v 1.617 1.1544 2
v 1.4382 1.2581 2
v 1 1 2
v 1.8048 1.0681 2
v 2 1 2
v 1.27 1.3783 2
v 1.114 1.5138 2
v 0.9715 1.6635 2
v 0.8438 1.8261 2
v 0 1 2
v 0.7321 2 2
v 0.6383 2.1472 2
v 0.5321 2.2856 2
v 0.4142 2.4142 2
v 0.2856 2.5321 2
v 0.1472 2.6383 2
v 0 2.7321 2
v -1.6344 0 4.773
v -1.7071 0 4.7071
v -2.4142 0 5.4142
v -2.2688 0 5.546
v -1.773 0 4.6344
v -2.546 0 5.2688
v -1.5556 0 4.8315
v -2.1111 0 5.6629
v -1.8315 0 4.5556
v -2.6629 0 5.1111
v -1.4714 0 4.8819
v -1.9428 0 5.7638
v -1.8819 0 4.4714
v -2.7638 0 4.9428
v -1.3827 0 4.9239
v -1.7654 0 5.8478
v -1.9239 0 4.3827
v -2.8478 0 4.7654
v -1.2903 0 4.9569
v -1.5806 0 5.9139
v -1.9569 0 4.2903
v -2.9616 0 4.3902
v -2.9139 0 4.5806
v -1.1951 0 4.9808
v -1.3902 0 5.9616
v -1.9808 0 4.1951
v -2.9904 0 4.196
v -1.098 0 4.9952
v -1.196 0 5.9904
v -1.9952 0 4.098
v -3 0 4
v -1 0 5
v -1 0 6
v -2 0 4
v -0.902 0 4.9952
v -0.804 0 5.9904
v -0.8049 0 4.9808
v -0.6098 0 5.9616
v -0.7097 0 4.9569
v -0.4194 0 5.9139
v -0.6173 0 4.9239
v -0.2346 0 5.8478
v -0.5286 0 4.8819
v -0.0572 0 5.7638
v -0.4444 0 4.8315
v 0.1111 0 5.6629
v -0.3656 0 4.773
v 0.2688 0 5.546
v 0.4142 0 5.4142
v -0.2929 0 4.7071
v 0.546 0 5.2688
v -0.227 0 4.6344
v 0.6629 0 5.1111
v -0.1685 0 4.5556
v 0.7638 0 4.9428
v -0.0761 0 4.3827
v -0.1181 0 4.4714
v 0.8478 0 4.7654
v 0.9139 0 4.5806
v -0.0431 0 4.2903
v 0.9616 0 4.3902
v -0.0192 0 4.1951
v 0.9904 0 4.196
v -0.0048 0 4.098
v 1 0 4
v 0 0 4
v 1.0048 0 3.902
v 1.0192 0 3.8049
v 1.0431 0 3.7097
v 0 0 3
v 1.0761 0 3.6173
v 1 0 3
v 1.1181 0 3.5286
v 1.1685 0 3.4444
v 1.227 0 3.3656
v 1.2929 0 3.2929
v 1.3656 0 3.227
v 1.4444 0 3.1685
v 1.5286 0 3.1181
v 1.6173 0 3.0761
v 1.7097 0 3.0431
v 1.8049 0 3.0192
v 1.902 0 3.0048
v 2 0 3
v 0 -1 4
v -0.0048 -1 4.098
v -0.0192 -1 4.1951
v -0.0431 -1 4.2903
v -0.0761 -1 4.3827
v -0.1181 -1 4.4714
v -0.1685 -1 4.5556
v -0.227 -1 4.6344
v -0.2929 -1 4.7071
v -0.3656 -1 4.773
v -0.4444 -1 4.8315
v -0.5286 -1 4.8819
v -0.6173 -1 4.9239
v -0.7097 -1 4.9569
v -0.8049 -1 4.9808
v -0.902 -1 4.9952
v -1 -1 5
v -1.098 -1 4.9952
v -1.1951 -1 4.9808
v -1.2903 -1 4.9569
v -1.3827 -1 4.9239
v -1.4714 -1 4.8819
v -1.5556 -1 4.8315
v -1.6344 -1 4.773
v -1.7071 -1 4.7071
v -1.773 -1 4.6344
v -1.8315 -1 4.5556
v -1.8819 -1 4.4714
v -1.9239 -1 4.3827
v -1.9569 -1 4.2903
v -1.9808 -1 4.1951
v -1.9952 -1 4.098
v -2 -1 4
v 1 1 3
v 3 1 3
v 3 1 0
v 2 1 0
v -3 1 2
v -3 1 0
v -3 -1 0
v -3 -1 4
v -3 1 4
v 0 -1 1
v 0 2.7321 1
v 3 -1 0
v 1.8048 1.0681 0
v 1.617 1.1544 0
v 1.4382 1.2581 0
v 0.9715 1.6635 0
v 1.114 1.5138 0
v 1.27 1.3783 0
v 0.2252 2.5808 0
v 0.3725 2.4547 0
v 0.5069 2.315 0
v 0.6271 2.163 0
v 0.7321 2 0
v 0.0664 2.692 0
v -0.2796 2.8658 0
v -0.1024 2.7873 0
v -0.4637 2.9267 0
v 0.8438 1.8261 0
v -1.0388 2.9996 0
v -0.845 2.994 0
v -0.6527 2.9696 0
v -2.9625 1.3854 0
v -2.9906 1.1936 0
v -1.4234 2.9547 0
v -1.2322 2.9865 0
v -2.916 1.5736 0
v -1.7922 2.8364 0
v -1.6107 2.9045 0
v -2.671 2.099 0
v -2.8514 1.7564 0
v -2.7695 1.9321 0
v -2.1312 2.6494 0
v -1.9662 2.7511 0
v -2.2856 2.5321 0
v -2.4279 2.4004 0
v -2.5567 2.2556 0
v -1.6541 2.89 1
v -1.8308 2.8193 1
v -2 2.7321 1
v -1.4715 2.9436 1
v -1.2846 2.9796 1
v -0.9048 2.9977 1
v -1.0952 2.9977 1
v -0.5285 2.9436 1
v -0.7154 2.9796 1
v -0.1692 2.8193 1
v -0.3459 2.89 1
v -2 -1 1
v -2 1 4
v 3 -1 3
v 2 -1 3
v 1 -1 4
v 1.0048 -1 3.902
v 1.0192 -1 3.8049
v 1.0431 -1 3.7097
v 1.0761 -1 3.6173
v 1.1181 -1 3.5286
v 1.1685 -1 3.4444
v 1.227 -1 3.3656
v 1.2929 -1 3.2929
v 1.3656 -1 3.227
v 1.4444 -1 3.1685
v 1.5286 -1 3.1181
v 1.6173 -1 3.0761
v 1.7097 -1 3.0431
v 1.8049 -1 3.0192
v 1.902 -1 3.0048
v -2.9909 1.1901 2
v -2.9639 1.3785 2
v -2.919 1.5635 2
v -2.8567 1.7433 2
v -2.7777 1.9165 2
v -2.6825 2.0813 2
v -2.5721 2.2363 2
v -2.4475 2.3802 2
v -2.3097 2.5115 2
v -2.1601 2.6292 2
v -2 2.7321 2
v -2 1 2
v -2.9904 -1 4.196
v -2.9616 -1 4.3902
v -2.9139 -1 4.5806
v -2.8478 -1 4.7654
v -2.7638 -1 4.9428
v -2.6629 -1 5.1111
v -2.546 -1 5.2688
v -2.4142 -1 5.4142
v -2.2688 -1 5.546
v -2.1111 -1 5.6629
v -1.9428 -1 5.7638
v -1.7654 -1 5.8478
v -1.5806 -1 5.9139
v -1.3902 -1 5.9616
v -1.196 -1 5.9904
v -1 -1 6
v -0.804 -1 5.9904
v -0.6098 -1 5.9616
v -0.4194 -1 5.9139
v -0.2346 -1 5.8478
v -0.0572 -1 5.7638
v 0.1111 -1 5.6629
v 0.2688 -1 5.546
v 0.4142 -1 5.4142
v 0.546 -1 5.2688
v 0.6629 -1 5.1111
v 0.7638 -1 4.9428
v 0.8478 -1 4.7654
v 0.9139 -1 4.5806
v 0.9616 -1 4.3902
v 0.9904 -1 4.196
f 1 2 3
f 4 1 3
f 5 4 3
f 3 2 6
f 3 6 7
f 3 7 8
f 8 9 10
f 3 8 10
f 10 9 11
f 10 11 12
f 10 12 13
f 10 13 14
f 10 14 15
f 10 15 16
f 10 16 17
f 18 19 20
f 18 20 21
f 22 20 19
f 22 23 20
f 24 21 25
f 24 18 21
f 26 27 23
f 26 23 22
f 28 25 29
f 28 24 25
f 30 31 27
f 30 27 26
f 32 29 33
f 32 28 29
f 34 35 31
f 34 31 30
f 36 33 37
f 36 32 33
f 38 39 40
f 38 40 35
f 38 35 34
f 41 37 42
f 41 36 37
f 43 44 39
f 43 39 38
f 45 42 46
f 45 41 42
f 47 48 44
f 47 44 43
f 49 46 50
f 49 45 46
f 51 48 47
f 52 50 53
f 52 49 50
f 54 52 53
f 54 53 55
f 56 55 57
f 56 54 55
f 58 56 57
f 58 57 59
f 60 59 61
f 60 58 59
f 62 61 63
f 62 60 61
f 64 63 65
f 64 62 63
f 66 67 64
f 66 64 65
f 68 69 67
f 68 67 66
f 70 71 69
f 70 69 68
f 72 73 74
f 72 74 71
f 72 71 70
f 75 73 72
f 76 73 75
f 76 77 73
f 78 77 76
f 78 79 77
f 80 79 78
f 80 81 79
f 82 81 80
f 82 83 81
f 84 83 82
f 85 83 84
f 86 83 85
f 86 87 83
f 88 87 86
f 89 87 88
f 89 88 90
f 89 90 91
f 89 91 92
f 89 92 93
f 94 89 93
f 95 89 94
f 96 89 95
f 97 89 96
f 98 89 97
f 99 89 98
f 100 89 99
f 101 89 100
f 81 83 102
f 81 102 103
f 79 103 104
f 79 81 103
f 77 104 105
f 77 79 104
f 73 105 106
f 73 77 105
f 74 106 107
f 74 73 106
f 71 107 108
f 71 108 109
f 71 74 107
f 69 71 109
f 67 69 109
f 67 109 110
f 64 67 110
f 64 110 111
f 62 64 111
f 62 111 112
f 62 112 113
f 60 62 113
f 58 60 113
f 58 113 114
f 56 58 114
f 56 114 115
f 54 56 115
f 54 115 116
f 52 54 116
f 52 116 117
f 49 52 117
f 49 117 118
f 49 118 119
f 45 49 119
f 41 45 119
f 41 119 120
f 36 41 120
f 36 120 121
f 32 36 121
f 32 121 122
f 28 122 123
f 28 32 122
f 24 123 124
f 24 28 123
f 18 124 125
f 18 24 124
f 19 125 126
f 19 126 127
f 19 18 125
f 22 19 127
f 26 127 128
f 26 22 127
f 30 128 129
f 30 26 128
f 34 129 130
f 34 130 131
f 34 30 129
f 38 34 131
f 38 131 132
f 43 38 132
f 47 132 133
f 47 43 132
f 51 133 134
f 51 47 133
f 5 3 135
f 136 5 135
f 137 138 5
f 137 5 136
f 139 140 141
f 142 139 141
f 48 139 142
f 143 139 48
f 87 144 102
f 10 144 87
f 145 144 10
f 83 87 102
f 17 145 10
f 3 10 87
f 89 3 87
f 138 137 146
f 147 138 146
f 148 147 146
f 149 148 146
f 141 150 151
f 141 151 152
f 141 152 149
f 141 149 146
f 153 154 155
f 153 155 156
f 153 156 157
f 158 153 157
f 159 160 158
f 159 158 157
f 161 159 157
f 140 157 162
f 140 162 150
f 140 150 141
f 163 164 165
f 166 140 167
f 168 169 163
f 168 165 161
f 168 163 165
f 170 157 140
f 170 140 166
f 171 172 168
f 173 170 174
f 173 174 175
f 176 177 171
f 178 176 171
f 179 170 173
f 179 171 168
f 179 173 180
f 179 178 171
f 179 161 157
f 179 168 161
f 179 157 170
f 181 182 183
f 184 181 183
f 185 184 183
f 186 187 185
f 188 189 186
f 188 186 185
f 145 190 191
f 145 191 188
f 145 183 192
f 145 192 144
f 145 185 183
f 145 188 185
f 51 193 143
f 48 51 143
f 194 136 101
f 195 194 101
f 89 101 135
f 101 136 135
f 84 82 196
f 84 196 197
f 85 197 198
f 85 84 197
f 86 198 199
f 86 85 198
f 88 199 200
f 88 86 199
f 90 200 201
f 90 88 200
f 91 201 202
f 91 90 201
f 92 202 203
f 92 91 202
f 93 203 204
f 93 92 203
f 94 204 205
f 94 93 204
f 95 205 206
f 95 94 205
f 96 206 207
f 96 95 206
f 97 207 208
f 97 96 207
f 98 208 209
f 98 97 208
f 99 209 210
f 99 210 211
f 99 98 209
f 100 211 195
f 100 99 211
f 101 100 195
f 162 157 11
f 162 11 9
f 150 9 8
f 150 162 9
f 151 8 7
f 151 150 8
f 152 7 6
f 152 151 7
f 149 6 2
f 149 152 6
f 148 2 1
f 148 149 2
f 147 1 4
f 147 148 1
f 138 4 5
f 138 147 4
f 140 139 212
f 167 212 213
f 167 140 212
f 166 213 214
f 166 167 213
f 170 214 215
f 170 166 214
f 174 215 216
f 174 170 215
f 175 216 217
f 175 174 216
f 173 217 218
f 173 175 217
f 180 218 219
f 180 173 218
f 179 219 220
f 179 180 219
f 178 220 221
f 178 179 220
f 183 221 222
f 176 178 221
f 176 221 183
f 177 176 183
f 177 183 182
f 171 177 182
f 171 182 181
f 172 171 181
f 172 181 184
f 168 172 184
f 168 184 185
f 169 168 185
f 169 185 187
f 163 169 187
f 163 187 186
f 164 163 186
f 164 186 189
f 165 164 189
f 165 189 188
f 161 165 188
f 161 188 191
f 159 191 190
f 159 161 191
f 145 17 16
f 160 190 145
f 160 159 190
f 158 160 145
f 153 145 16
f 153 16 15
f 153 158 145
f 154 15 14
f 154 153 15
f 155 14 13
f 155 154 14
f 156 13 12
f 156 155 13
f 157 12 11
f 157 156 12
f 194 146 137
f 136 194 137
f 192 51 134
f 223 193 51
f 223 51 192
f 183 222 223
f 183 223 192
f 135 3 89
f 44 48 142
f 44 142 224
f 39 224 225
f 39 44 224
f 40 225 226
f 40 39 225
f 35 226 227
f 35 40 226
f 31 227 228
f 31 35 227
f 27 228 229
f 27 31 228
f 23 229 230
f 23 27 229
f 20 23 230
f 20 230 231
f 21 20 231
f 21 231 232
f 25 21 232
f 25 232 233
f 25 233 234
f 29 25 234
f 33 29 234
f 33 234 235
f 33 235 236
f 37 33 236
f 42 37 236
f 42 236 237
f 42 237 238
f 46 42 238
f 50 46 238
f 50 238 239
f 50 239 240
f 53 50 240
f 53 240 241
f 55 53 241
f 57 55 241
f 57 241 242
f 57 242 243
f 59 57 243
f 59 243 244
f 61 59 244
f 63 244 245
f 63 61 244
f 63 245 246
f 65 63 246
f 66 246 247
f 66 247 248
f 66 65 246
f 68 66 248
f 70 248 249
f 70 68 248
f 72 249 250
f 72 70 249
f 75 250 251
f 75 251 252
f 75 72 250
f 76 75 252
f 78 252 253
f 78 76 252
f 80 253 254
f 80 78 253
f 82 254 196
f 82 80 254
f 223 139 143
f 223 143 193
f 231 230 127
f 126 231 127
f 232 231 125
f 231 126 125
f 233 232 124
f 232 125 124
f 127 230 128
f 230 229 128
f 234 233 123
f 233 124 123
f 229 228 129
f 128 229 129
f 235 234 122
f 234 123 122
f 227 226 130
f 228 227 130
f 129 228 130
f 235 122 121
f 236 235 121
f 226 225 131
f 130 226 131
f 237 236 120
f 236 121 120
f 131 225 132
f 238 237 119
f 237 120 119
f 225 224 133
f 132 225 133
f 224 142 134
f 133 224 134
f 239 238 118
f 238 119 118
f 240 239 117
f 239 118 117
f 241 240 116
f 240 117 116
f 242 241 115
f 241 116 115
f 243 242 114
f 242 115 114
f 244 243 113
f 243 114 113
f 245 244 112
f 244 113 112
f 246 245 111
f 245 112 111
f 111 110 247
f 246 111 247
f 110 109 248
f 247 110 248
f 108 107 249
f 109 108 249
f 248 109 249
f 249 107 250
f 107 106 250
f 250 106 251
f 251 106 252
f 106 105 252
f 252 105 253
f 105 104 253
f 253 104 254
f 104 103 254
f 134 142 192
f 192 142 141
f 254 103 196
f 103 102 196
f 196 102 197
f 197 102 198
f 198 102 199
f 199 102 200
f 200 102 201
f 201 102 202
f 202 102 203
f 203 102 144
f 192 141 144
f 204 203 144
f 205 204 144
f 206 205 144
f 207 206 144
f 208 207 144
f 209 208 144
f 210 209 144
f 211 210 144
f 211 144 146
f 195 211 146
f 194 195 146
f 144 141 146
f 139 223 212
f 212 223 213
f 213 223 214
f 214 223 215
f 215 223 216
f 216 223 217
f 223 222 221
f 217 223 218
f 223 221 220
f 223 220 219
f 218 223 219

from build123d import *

# Parameters (mm, degrees)
SKETCH1_W           = 6
SKETCH1_H           = 2
BOSS_EXTRUDE2_DEPTH = 3
BOSS_EXTRUDE3_DEPTH = 2
CUT_EXTRUDE2_DEPTH  = 2
CUT_EXTRUDE3_DEPTH  = 1
BOSS_EXTRUDE5_DEPTH = 2
CUT_EXTRUDE4_DEPTH  = 1


with BuildPart() as part:
    # Sketch1 → Boss-Extrude2 (new body)
    with BuildSketch(Plane.XY):
        Rectangle(SKETCH1_W, SKETCH1_H)
    extrude(amount=BOSS_EXTRUDE2_DEPTH)

    # Sketch3 → Boss-Extrude3 (add)
    with BuildSketch(Plane(origin=(0, 0, 0), x_dir=(-1, 0, 0), z_dir=(0, 0, -1))):
        with BuildLine():
            Line((-2, 1), (3, 1))
            ThreePointArc((3, 1), (1.51763809, 2.931851653), (-0.732050808, 2))
            ThreePointArc((-0.732050808, 2), (-1.270020956, 1.378271238), (-2, 1))
        make_face()
    extrude(amount=-BOSS_EXTRUDE3_DEPTH)

    # Sketch4 → Cut-Extrude2 (cut)
    with BuildSketch(Plane.XY.offset(3)):
        with BuildLine():
            Line((0, -1), (0, 2.732050808))
            ThreePointArc((0, 2.732050808), (-1, 3), (-2, 2.732050808))
            Line((-2, 2.732050808), (-2, -1))
            Line((-2, -1), (0, -1))
        make_face()
    extrude(amount=-CUT_EXTRUDE2_DEPTH, mode=Mode.SUBTRACT)

    # Sketch5 → Cut-Extrude3 (cut)
    with BuildSketch(Plane.ZY):
        Polygon((2, 1), (3, 0), (3, 1), align=None)
    extrude(amount=-CUT_EXTRUDE3_DEPTH, mode=Mode.SUBTRACT)

    # Sketch6 → Boss-Extrude5 (add)
    with BuildSketch(Plane(origin=(0, 1, 0), x_dir=(1, 0, 0), z_dir=(0, 1, 0))):
        with BuildLine():
            ThreePointArc((-3, -4), (-1, -6), (1, -4))
            ThreePointArc((1, -4), (1.292893219, -3.292893219), (2, -3))
            Line((2, -3), (0, -3))
            Line((0, -3), (0, -4))
            ThreePointArc((0, -4), (-1, -5), (-2, -4))
            Line((-2, -4), (-2, -3))
            Line((-2, -3), (-3, -3))
            Line((-3, -3), (-3, -4))
        make_face()
    extrude(amount=-BOSS_EXTRUDE5_DEPTH)

    # Sketch7 → Cut-Extrude4 (cut)
    with BuildSketch(Plane(origin=(0, 1, 0), x_dir=(1, 0, 0), z_dir=(0, 1, 0))):
        with BuildLine():
            Line((-2, -4), (-3, -4))
            ThreePointArc((-3, -4), (-1, -6), (1, -4))
            ThreePointArc((1, -4), (1.292893219, -3.292893219), (2, -3))
            Line((2, -3), (0, -3))
            Line((0, -3), (0, -4))
            ThreePointArc((0, -4), (-1, -5), (-2, -4))
        make_face()
    extrude(amount=-CUT_EXTRUDE4_DEPTH, mode=Mode.SUBTRACT)


solid = part.part
